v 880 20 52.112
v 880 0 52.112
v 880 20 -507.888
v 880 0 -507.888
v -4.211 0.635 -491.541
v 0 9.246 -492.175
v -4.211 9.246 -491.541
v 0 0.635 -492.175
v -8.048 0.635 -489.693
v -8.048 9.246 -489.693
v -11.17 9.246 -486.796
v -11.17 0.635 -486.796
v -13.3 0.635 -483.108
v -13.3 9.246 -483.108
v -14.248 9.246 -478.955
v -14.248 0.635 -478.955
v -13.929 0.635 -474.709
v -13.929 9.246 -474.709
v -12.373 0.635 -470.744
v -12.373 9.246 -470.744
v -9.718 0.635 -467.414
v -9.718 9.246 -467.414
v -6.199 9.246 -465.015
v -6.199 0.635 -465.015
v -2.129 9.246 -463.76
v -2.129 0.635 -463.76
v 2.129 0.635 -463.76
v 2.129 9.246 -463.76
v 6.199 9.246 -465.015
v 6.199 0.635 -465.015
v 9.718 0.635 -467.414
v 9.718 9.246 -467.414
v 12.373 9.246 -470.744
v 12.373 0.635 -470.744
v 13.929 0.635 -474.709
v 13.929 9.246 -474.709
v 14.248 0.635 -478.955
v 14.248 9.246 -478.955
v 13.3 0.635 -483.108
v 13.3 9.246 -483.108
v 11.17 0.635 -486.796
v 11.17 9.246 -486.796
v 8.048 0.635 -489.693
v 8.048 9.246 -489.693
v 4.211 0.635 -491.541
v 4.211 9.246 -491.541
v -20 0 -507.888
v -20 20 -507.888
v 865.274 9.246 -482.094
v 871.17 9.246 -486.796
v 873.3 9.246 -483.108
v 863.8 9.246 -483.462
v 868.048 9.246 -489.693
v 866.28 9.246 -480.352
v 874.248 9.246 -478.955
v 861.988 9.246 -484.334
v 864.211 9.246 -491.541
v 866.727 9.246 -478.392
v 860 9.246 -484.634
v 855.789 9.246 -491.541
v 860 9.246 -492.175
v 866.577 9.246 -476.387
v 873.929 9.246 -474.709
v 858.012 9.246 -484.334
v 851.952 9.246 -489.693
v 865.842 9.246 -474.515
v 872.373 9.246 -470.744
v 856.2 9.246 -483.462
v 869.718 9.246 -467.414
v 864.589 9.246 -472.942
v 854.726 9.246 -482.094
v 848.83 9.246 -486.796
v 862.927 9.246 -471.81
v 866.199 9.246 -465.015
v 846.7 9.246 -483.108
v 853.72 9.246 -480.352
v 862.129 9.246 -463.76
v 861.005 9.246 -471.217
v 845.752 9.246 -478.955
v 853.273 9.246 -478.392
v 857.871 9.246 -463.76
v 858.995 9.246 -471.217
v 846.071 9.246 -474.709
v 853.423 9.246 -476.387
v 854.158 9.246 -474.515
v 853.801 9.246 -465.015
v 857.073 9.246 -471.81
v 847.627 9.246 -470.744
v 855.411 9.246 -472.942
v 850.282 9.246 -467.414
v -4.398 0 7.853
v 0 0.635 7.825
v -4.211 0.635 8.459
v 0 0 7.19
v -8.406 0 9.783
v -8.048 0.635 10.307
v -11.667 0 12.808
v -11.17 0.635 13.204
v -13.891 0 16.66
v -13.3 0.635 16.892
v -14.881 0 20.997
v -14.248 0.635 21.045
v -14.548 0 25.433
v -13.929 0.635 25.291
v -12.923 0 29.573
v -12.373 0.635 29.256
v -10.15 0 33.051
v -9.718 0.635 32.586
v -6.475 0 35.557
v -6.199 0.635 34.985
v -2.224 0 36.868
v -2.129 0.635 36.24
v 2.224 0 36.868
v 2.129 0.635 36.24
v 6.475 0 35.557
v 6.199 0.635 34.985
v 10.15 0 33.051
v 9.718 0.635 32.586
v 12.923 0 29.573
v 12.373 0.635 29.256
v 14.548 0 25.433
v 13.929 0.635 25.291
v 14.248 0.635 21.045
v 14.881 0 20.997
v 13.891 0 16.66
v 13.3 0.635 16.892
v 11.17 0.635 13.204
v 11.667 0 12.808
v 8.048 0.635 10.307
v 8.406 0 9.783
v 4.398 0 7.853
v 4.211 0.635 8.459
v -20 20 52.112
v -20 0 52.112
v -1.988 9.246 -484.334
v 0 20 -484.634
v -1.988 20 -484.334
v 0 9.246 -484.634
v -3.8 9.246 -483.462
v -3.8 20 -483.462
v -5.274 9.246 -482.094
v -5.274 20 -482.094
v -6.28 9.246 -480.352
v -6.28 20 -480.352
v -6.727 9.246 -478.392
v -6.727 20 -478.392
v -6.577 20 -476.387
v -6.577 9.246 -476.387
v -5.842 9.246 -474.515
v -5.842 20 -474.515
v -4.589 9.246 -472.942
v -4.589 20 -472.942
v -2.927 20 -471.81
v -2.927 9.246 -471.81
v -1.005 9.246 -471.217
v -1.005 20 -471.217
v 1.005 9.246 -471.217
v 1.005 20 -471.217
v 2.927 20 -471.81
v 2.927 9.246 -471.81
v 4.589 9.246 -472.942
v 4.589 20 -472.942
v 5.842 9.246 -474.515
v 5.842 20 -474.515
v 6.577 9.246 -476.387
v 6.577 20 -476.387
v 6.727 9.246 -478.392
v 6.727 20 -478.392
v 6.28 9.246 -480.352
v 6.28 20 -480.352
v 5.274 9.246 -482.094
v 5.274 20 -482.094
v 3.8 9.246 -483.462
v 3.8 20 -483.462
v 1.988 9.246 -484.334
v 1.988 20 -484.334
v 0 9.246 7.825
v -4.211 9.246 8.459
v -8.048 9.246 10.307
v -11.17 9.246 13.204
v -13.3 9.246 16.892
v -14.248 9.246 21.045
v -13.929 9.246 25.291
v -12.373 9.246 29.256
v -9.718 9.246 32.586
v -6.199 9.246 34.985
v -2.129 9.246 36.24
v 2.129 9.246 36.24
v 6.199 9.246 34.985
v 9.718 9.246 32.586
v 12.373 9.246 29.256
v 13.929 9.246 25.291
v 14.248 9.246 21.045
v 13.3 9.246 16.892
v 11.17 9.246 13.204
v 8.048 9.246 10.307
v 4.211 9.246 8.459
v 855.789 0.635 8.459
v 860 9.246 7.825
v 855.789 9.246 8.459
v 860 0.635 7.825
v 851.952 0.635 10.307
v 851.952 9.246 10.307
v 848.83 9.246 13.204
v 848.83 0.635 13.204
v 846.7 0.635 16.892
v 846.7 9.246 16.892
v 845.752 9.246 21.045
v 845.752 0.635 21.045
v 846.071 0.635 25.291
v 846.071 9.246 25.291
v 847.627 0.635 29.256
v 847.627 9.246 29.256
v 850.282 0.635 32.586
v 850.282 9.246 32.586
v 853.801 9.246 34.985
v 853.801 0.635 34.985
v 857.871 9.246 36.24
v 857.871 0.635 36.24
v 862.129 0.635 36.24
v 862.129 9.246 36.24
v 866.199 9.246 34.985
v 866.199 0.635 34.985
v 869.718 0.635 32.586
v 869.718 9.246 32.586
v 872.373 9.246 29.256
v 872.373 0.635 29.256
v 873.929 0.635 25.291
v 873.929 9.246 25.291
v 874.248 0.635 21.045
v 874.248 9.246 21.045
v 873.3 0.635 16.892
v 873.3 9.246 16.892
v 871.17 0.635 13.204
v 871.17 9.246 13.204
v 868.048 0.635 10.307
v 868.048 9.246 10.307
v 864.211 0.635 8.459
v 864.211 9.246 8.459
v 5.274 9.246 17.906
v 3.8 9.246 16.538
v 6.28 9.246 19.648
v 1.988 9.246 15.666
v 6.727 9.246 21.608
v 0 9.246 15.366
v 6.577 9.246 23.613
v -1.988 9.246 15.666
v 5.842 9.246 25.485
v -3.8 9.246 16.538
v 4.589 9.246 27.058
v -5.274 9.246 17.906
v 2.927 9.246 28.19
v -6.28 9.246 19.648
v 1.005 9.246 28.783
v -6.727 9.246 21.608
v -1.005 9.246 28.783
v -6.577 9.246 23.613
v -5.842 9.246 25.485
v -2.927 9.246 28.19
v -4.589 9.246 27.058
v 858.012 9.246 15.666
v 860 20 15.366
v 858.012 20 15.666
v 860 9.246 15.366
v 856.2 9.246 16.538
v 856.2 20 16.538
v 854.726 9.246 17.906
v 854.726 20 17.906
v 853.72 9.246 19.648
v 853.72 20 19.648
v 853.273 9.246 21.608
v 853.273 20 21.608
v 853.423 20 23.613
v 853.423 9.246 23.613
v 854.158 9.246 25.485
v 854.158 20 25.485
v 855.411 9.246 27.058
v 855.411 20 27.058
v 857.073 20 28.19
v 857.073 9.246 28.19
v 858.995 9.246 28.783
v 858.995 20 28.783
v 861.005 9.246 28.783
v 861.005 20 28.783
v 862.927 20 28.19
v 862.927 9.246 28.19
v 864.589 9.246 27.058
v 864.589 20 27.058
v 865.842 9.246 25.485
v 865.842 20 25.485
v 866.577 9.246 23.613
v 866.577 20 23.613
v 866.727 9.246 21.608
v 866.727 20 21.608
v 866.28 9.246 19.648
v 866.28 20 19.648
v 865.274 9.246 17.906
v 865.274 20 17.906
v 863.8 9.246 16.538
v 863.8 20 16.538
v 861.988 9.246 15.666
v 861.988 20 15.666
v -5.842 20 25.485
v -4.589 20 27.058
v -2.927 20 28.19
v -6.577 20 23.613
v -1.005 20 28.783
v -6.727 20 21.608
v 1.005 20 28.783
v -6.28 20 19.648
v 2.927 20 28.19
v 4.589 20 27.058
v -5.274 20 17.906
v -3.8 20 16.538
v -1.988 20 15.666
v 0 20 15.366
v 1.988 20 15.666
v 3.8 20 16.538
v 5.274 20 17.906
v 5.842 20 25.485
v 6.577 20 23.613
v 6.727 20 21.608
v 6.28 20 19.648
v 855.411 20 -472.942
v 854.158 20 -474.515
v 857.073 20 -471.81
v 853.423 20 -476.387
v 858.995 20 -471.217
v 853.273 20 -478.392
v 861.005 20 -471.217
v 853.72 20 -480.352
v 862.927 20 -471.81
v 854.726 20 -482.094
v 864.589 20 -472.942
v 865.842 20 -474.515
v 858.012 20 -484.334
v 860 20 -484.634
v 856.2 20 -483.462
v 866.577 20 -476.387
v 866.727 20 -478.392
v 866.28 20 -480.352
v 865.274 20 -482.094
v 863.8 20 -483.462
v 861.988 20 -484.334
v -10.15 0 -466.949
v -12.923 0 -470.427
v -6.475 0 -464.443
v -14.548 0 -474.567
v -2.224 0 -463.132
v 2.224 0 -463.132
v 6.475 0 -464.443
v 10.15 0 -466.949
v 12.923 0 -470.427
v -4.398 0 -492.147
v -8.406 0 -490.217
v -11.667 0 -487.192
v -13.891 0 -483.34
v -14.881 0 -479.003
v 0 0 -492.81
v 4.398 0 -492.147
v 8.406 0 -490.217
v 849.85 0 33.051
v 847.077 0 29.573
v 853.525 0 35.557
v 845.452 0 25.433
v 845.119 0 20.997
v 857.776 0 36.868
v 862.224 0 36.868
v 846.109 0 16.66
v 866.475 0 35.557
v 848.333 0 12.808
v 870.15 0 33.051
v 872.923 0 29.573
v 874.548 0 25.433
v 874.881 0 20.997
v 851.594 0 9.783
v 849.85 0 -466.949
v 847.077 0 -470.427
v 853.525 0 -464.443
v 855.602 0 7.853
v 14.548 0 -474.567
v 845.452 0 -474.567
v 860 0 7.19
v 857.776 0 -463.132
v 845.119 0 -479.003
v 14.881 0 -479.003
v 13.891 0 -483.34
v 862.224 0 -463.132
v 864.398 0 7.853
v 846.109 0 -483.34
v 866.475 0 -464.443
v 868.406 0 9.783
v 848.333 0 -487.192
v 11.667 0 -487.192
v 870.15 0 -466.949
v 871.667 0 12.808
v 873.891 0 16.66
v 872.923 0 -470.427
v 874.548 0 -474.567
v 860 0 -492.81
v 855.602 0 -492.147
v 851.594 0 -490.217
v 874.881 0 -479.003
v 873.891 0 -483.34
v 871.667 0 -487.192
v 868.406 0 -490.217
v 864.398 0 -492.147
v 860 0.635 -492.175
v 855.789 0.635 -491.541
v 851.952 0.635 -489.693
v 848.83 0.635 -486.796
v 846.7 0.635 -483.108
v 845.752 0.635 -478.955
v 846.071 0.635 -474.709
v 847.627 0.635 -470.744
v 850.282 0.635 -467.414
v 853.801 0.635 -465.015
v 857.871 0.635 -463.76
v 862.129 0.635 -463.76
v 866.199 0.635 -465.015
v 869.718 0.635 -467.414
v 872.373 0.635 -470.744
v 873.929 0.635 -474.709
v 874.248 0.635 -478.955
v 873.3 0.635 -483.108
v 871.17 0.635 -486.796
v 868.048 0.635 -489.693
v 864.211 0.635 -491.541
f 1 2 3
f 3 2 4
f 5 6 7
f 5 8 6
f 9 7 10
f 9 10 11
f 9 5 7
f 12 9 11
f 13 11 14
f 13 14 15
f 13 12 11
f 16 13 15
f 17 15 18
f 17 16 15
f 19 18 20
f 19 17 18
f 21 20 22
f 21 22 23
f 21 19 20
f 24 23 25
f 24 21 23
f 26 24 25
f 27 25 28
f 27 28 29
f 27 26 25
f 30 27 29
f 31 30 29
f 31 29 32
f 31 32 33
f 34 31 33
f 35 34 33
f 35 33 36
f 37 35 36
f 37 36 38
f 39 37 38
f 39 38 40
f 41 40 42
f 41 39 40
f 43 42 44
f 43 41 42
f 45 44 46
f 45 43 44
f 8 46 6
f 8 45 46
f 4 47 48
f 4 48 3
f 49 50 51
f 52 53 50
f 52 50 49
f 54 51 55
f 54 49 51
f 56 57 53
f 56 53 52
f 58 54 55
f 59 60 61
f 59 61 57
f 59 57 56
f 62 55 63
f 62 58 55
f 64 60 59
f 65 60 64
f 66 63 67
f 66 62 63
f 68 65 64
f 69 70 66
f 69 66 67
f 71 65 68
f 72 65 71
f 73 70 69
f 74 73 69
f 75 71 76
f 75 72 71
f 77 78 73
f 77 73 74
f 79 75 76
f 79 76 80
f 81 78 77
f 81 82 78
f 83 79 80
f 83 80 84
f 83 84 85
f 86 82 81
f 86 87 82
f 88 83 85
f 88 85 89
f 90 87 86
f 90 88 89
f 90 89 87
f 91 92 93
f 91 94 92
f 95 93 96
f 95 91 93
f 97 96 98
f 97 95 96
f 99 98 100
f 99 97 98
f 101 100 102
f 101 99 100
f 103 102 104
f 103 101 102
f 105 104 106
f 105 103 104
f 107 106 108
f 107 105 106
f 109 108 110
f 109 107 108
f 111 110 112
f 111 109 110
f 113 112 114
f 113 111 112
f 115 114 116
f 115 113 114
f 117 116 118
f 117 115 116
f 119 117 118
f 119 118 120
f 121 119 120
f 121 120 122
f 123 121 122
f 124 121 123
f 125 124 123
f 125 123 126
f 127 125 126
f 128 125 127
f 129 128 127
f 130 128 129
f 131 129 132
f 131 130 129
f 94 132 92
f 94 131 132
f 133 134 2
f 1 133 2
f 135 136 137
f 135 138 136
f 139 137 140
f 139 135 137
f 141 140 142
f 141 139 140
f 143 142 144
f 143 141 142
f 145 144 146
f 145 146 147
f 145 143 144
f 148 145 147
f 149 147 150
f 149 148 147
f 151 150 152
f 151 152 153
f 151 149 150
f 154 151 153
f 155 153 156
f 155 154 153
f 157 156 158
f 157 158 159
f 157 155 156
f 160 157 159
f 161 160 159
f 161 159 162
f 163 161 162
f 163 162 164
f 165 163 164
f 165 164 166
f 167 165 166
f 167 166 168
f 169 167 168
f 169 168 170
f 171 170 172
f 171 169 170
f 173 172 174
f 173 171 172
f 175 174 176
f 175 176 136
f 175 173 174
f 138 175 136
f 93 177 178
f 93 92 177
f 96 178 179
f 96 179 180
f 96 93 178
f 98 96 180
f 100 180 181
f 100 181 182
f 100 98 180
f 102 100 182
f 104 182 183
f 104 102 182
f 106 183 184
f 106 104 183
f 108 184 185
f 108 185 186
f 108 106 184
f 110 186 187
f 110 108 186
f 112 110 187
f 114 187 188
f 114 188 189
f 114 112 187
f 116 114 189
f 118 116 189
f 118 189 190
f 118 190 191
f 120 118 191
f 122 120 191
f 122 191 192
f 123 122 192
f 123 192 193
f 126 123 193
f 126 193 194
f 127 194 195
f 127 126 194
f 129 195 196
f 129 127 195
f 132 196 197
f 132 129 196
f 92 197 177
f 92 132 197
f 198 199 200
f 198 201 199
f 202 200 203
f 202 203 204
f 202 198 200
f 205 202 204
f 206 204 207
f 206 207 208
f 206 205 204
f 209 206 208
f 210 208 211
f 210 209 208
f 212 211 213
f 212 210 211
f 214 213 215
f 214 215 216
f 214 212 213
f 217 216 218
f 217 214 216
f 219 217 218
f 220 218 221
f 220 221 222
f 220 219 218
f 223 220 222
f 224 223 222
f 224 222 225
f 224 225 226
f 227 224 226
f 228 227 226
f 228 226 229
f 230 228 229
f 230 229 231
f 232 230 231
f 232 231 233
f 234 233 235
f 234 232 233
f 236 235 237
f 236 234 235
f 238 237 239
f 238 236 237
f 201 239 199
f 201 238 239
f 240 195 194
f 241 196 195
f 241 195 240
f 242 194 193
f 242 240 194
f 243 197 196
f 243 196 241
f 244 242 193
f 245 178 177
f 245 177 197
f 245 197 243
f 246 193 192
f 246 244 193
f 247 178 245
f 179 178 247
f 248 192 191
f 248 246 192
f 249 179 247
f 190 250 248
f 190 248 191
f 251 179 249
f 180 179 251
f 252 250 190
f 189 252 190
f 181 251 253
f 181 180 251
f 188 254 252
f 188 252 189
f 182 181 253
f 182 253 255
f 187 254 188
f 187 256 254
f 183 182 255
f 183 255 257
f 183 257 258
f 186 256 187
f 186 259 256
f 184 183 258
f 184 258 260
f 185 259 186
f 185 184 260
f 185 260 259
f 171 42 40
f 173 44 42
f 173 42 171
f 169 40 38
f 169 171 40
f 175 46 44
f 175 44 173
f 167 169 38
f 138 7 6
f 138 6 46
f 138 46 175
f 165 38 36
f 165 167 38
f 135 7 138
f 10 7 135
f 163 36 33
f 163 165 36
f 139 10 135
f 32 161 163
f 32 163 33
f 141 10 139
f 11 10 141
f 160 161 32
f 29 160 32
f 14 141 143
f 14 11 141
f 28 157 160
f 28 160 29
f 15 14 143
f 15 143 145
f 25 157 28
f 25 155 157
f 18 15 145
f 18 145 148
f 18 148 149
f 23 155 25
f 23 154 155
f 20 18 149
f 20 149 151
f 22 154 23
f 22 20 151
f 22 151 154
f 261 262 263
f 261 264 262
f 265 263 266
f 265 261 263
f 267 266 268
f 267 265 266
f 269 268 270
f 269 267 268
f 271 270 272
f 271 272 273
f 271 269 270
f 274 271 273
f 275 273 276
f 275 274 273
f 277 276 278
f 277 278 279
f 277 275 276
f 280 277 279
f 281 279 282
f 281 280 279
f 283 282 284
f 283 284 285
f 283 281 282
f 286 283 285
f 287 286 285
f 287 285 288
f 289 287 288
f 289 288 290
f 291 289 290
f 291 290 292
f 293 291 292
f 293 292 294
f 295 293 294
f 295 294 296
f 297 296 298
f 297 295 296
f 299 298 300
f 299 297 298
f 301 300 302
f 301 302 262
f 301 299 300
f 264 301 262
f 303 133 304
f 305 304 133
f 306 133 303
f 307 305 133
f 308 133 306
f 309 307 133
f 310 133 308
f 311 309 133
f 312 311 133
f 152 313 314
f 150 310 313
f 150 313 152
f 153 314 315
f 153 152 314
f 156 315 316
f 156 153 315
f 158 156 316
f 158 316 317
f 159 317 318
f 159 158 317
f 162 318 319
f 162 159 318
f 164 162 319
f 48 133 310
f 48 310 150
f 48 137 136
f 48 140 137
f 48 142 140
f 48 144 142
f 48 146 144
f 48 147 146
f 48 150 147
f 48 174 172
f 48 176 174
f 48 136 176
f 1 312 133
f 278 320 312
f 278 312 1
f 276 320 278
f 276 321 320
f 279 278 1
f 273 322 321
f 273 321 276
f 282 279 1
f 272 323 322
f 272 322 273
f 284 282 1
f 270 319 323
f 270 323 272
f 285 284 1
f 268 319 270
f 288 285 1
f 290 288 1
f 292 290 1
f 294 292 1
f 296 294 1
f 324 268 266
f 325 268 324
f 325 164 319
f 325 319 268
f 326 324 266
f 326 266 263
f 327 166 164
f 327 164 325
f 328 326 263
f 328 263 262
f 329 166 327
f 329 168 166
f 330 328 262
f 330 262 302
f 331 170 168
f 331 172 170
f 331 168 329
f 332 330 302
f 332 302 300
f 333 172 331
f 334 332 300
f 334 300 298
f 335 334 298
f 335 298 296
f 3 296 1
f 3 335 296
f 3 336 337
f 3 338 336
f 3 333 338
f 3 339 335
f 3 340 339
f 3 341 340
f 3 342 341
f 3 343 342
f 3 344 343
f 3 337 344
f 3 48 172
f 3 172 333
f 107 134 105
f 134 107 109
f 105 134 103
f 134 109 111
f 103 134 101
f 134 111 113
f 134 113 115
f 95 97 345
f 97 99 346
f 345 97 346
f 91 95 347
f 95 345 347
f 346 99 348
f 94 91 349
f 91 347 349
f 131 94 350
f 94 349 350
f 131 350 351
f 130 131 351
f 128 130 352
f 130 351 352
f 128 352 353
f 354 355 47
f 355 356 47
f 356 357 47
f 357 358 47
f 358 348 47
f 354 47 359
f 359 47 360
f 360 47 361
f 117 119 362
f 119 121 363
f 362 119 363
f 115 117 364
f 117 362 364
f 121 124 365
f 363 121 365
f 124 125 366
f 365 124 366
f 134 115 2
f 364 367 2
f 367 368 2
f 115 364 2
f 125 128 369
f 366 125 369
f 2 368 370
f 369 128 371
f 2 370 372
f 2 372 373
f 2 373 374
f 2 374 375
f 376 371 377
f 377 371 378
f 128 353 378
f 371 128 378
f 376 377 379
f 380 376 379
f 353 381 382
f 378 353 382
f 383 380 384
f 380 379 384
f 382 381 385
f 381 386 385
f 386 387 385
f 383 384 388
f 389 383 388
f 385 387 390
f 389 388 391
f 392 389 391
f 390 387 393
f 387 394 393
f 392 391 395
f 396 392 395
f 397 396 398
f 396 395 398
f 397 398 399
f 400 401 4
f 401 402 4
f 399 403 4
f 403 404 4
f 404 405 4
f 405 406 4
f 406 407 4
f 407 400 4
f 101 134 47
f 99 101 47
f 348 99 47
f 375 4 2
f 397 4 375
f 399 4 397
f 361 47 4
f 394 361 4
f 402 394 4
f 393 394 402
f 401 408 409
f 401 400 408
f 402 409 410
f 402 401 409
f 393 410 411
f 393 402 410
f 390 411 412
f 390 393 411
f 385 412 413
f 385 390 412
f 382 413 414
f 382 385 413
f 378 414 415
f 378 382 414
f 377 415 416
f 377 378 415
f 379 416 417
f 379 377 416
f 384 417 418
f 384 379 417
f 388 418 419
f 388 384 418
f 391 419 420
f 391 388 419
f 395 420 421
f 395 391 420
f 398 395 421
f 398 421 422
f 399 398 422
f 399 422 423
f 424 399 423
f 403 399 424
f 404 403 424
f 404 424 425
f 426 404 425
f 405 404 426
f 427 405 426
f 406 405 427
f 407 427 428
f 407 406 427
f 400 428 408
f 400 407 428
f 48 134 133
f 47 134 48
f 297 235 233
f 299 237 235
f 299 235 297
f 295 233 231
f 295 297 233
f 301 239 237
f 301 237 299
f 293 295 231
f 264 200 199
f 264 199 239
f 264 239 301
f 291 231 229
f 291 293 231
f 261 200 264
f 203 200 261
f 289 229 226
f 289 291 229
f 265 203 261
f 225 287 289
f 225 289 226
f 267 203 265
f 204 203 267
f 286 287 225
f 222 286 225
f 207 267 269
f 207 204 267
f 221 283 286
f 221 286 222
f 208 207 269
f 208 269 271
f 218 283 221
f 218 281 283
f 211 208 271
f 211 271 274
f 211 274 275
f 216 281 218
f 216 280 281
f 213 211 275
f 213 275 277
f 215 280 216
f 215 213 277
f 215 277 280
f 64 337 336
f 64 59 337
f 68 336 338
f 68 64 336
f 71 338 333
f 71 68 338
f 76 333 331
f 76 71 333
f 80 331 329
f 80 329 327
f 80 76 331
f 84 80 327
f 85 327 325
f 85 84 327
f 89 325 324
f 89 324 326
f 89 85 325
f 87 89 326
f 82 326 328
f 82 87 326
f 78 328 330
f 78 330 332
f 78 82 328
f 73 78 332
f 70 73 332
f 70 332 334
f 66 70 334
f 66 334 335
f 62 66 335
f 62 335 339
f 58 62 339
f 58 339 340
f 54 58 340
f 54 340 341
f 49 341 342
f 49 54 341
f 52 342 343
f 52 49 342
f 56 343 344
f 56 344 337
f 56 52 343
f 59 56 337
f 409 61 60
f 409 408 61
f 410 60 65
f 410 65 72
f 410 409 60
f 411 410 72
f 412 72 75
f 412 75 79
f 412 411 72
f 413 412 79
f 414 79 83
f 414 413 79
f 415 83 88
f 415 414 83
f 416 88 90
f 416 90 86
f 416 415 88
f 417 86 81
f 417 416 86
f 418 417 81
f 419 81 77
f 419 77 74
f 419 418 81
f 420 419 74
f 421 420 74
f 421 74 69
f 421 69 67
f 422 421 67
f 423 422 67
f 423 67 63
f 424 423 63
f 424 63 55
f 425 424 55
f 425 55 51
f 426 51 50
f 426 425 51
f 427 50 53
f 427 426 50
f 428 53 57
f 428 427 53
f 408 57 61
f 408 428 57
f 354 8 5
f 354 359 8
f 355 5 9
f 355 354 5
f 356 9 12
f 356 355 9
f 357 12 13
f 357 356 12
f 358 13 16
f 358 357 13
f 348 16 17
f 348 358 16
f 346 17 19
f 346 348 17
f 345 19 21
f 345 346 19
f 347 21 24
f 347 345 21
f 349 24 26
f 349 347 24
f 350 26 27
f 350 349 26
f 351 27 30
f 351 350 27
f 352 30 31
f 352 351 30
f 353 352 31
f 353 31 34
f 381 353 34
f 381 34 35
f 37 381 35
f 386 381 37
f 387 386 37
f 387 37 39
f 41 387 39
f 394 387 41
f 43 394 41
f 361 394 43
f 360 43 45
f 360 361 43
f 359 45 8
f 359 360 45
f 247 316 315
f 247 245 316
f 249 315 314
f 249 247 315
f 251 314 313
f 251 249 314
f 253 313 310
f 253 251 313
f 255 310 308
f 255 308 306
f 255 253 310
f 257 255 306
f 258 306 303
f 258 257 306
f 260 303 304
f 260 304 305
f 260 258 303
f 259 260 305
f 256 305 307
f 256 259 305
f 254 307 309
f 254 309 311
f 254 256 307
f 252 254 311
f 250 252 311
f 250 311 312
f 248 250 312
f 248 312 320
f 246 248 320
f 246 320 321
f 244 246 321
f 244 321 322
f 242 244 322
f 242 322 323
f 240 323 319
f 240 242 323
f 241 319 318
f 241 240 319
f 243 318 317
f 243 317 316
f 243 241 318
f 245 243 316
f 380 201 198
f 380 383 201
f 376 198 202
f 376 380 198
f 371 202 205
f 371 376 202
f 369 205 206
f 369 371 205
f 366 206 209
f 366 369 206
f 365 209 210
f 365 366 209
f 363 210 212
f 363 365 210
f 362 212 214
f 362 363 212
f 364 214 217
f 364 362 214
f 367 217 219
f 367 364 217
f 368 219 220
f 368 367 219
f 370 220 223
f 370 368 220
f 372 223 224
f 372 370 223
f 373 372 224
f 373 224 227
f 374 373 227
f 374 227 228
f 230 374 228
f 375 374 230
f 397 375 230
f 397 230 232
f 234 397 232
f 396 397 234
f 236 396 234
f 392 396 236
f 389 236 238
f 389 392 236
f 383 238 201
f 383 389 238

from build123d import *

# Parameters (mm, degrees)
SKETCH1_W                                = 900
SKETCH1_H                                = 560
BOSS_EXTRUDE1_DEPTH                      = 20
CBORE_FOR_1_2_HEAVY_HEX_BOLT1_AT_2_COUNT = 2
CBORE_FOR_1_2_HEAVY_HEX_BOLT1_AT_2_PITCH = 860
CBORE_FOR_1_2_HEAVY_HEX_BOLT1_AT_3_COUNT = 2
CBORE_FOR_1_2_HEAVY_HEX_BOLT1_AT_3_PITCH = 994.786409236
CBORE_FOR_1_2_HEAVY_HEX_BOLT1_AT_4_COUNT = 2
CBORE_FOR_1_2_HEAVY_HEX_BOLT1_AT_4_PITCH = 500


with BuildPart() as part:
    # Sketch1 → Boss-Extrude1 (new body)
    with BuildSketch(Plane(origin=(0, 0, 0), x_dir=(1, 0, 0), z_dir=(0, 1, 0))):
        with Locations((430, 227.887771015)):
            Rectangle(SKETCH1_W, SKETCH1_H)
    extrude(amount=BOSS_EXTRUDE1_DEPTH)

    # Sketch3 → CBORE for 1/2 Heavy Hex Bolt1 (revolve, cut)
    with BuildSketch(Plane(origin=(0, 0, -477.887771015), x_dir=(0, 0, -1), z_dir=(1, 0, 0))):
        Polygon((0, 0), (0, 20), (6.74624, 20), (6.74624, 9.2456), (14.2875, 9.2456), (14.2875, 0.635), (14.9225, 0), align=None)
    cbore_for_1_2_heavy_hex_bolt1 = revolve(axis=Axis((0, -6.35, -477.887771015), (0, 1, 0)), mode=Mode.SUBTRACT)

    # CBORE for 1/2 Heavy Hex Bolt1 at 2: CBORE for 1/2 Heavy Hex Bolt1 ×2
    with Locations(*[(i * CBORE_FOR_1_2_HEAVY_HEX_BOLT1_AT_2_PITCH, 0, 0) for i in range(1, CBORE_FOR_1_2_HEAVY_HEX_BOLT1_AT_2_COUNT)]):
        add(cbore_for_1_2_heavy_hex_bolt1, mode=Mode.SUBTRACT)

    # CBORE for 1/2 Heavy Hex Bolt1 at 3: CBORE for 1/2 Heavy Hex Bolt1 ×2
    with Locations(*[Vector(0.864507187, 0, 0.502620457) * (i * CBORE_FOR_1_2_HEAVY_HEX_BOLT1_AT_3_PITCH) for i in range(1, CBORE_FOR_1_2_HEAVY_HEX_BOLT1_AT_3_COUNT)]):
        add(cbore_for_1_2_heavy_hex_bolt1, mode=Mode.SUBTRACT)

    # CBORE for 1/2 Heavy Hex Bolt1 at 4: CBORE for 1/2 Heavy Hex Bolt1 ×2
    with Locations(*[(0, 0, i * CBORE_FOR_1_2_HEAVY_HEX_BOLT1_AT_4_PITCH) for i in range(1, CBORE_FOR_1_2_HEAVY_HEX_BOLT1_AT_4_COUNT)]):
        add(cbore_for_1_2_heavy_hex_bolt1, mode=Mode.SUBTRACT)


solid = part.part
